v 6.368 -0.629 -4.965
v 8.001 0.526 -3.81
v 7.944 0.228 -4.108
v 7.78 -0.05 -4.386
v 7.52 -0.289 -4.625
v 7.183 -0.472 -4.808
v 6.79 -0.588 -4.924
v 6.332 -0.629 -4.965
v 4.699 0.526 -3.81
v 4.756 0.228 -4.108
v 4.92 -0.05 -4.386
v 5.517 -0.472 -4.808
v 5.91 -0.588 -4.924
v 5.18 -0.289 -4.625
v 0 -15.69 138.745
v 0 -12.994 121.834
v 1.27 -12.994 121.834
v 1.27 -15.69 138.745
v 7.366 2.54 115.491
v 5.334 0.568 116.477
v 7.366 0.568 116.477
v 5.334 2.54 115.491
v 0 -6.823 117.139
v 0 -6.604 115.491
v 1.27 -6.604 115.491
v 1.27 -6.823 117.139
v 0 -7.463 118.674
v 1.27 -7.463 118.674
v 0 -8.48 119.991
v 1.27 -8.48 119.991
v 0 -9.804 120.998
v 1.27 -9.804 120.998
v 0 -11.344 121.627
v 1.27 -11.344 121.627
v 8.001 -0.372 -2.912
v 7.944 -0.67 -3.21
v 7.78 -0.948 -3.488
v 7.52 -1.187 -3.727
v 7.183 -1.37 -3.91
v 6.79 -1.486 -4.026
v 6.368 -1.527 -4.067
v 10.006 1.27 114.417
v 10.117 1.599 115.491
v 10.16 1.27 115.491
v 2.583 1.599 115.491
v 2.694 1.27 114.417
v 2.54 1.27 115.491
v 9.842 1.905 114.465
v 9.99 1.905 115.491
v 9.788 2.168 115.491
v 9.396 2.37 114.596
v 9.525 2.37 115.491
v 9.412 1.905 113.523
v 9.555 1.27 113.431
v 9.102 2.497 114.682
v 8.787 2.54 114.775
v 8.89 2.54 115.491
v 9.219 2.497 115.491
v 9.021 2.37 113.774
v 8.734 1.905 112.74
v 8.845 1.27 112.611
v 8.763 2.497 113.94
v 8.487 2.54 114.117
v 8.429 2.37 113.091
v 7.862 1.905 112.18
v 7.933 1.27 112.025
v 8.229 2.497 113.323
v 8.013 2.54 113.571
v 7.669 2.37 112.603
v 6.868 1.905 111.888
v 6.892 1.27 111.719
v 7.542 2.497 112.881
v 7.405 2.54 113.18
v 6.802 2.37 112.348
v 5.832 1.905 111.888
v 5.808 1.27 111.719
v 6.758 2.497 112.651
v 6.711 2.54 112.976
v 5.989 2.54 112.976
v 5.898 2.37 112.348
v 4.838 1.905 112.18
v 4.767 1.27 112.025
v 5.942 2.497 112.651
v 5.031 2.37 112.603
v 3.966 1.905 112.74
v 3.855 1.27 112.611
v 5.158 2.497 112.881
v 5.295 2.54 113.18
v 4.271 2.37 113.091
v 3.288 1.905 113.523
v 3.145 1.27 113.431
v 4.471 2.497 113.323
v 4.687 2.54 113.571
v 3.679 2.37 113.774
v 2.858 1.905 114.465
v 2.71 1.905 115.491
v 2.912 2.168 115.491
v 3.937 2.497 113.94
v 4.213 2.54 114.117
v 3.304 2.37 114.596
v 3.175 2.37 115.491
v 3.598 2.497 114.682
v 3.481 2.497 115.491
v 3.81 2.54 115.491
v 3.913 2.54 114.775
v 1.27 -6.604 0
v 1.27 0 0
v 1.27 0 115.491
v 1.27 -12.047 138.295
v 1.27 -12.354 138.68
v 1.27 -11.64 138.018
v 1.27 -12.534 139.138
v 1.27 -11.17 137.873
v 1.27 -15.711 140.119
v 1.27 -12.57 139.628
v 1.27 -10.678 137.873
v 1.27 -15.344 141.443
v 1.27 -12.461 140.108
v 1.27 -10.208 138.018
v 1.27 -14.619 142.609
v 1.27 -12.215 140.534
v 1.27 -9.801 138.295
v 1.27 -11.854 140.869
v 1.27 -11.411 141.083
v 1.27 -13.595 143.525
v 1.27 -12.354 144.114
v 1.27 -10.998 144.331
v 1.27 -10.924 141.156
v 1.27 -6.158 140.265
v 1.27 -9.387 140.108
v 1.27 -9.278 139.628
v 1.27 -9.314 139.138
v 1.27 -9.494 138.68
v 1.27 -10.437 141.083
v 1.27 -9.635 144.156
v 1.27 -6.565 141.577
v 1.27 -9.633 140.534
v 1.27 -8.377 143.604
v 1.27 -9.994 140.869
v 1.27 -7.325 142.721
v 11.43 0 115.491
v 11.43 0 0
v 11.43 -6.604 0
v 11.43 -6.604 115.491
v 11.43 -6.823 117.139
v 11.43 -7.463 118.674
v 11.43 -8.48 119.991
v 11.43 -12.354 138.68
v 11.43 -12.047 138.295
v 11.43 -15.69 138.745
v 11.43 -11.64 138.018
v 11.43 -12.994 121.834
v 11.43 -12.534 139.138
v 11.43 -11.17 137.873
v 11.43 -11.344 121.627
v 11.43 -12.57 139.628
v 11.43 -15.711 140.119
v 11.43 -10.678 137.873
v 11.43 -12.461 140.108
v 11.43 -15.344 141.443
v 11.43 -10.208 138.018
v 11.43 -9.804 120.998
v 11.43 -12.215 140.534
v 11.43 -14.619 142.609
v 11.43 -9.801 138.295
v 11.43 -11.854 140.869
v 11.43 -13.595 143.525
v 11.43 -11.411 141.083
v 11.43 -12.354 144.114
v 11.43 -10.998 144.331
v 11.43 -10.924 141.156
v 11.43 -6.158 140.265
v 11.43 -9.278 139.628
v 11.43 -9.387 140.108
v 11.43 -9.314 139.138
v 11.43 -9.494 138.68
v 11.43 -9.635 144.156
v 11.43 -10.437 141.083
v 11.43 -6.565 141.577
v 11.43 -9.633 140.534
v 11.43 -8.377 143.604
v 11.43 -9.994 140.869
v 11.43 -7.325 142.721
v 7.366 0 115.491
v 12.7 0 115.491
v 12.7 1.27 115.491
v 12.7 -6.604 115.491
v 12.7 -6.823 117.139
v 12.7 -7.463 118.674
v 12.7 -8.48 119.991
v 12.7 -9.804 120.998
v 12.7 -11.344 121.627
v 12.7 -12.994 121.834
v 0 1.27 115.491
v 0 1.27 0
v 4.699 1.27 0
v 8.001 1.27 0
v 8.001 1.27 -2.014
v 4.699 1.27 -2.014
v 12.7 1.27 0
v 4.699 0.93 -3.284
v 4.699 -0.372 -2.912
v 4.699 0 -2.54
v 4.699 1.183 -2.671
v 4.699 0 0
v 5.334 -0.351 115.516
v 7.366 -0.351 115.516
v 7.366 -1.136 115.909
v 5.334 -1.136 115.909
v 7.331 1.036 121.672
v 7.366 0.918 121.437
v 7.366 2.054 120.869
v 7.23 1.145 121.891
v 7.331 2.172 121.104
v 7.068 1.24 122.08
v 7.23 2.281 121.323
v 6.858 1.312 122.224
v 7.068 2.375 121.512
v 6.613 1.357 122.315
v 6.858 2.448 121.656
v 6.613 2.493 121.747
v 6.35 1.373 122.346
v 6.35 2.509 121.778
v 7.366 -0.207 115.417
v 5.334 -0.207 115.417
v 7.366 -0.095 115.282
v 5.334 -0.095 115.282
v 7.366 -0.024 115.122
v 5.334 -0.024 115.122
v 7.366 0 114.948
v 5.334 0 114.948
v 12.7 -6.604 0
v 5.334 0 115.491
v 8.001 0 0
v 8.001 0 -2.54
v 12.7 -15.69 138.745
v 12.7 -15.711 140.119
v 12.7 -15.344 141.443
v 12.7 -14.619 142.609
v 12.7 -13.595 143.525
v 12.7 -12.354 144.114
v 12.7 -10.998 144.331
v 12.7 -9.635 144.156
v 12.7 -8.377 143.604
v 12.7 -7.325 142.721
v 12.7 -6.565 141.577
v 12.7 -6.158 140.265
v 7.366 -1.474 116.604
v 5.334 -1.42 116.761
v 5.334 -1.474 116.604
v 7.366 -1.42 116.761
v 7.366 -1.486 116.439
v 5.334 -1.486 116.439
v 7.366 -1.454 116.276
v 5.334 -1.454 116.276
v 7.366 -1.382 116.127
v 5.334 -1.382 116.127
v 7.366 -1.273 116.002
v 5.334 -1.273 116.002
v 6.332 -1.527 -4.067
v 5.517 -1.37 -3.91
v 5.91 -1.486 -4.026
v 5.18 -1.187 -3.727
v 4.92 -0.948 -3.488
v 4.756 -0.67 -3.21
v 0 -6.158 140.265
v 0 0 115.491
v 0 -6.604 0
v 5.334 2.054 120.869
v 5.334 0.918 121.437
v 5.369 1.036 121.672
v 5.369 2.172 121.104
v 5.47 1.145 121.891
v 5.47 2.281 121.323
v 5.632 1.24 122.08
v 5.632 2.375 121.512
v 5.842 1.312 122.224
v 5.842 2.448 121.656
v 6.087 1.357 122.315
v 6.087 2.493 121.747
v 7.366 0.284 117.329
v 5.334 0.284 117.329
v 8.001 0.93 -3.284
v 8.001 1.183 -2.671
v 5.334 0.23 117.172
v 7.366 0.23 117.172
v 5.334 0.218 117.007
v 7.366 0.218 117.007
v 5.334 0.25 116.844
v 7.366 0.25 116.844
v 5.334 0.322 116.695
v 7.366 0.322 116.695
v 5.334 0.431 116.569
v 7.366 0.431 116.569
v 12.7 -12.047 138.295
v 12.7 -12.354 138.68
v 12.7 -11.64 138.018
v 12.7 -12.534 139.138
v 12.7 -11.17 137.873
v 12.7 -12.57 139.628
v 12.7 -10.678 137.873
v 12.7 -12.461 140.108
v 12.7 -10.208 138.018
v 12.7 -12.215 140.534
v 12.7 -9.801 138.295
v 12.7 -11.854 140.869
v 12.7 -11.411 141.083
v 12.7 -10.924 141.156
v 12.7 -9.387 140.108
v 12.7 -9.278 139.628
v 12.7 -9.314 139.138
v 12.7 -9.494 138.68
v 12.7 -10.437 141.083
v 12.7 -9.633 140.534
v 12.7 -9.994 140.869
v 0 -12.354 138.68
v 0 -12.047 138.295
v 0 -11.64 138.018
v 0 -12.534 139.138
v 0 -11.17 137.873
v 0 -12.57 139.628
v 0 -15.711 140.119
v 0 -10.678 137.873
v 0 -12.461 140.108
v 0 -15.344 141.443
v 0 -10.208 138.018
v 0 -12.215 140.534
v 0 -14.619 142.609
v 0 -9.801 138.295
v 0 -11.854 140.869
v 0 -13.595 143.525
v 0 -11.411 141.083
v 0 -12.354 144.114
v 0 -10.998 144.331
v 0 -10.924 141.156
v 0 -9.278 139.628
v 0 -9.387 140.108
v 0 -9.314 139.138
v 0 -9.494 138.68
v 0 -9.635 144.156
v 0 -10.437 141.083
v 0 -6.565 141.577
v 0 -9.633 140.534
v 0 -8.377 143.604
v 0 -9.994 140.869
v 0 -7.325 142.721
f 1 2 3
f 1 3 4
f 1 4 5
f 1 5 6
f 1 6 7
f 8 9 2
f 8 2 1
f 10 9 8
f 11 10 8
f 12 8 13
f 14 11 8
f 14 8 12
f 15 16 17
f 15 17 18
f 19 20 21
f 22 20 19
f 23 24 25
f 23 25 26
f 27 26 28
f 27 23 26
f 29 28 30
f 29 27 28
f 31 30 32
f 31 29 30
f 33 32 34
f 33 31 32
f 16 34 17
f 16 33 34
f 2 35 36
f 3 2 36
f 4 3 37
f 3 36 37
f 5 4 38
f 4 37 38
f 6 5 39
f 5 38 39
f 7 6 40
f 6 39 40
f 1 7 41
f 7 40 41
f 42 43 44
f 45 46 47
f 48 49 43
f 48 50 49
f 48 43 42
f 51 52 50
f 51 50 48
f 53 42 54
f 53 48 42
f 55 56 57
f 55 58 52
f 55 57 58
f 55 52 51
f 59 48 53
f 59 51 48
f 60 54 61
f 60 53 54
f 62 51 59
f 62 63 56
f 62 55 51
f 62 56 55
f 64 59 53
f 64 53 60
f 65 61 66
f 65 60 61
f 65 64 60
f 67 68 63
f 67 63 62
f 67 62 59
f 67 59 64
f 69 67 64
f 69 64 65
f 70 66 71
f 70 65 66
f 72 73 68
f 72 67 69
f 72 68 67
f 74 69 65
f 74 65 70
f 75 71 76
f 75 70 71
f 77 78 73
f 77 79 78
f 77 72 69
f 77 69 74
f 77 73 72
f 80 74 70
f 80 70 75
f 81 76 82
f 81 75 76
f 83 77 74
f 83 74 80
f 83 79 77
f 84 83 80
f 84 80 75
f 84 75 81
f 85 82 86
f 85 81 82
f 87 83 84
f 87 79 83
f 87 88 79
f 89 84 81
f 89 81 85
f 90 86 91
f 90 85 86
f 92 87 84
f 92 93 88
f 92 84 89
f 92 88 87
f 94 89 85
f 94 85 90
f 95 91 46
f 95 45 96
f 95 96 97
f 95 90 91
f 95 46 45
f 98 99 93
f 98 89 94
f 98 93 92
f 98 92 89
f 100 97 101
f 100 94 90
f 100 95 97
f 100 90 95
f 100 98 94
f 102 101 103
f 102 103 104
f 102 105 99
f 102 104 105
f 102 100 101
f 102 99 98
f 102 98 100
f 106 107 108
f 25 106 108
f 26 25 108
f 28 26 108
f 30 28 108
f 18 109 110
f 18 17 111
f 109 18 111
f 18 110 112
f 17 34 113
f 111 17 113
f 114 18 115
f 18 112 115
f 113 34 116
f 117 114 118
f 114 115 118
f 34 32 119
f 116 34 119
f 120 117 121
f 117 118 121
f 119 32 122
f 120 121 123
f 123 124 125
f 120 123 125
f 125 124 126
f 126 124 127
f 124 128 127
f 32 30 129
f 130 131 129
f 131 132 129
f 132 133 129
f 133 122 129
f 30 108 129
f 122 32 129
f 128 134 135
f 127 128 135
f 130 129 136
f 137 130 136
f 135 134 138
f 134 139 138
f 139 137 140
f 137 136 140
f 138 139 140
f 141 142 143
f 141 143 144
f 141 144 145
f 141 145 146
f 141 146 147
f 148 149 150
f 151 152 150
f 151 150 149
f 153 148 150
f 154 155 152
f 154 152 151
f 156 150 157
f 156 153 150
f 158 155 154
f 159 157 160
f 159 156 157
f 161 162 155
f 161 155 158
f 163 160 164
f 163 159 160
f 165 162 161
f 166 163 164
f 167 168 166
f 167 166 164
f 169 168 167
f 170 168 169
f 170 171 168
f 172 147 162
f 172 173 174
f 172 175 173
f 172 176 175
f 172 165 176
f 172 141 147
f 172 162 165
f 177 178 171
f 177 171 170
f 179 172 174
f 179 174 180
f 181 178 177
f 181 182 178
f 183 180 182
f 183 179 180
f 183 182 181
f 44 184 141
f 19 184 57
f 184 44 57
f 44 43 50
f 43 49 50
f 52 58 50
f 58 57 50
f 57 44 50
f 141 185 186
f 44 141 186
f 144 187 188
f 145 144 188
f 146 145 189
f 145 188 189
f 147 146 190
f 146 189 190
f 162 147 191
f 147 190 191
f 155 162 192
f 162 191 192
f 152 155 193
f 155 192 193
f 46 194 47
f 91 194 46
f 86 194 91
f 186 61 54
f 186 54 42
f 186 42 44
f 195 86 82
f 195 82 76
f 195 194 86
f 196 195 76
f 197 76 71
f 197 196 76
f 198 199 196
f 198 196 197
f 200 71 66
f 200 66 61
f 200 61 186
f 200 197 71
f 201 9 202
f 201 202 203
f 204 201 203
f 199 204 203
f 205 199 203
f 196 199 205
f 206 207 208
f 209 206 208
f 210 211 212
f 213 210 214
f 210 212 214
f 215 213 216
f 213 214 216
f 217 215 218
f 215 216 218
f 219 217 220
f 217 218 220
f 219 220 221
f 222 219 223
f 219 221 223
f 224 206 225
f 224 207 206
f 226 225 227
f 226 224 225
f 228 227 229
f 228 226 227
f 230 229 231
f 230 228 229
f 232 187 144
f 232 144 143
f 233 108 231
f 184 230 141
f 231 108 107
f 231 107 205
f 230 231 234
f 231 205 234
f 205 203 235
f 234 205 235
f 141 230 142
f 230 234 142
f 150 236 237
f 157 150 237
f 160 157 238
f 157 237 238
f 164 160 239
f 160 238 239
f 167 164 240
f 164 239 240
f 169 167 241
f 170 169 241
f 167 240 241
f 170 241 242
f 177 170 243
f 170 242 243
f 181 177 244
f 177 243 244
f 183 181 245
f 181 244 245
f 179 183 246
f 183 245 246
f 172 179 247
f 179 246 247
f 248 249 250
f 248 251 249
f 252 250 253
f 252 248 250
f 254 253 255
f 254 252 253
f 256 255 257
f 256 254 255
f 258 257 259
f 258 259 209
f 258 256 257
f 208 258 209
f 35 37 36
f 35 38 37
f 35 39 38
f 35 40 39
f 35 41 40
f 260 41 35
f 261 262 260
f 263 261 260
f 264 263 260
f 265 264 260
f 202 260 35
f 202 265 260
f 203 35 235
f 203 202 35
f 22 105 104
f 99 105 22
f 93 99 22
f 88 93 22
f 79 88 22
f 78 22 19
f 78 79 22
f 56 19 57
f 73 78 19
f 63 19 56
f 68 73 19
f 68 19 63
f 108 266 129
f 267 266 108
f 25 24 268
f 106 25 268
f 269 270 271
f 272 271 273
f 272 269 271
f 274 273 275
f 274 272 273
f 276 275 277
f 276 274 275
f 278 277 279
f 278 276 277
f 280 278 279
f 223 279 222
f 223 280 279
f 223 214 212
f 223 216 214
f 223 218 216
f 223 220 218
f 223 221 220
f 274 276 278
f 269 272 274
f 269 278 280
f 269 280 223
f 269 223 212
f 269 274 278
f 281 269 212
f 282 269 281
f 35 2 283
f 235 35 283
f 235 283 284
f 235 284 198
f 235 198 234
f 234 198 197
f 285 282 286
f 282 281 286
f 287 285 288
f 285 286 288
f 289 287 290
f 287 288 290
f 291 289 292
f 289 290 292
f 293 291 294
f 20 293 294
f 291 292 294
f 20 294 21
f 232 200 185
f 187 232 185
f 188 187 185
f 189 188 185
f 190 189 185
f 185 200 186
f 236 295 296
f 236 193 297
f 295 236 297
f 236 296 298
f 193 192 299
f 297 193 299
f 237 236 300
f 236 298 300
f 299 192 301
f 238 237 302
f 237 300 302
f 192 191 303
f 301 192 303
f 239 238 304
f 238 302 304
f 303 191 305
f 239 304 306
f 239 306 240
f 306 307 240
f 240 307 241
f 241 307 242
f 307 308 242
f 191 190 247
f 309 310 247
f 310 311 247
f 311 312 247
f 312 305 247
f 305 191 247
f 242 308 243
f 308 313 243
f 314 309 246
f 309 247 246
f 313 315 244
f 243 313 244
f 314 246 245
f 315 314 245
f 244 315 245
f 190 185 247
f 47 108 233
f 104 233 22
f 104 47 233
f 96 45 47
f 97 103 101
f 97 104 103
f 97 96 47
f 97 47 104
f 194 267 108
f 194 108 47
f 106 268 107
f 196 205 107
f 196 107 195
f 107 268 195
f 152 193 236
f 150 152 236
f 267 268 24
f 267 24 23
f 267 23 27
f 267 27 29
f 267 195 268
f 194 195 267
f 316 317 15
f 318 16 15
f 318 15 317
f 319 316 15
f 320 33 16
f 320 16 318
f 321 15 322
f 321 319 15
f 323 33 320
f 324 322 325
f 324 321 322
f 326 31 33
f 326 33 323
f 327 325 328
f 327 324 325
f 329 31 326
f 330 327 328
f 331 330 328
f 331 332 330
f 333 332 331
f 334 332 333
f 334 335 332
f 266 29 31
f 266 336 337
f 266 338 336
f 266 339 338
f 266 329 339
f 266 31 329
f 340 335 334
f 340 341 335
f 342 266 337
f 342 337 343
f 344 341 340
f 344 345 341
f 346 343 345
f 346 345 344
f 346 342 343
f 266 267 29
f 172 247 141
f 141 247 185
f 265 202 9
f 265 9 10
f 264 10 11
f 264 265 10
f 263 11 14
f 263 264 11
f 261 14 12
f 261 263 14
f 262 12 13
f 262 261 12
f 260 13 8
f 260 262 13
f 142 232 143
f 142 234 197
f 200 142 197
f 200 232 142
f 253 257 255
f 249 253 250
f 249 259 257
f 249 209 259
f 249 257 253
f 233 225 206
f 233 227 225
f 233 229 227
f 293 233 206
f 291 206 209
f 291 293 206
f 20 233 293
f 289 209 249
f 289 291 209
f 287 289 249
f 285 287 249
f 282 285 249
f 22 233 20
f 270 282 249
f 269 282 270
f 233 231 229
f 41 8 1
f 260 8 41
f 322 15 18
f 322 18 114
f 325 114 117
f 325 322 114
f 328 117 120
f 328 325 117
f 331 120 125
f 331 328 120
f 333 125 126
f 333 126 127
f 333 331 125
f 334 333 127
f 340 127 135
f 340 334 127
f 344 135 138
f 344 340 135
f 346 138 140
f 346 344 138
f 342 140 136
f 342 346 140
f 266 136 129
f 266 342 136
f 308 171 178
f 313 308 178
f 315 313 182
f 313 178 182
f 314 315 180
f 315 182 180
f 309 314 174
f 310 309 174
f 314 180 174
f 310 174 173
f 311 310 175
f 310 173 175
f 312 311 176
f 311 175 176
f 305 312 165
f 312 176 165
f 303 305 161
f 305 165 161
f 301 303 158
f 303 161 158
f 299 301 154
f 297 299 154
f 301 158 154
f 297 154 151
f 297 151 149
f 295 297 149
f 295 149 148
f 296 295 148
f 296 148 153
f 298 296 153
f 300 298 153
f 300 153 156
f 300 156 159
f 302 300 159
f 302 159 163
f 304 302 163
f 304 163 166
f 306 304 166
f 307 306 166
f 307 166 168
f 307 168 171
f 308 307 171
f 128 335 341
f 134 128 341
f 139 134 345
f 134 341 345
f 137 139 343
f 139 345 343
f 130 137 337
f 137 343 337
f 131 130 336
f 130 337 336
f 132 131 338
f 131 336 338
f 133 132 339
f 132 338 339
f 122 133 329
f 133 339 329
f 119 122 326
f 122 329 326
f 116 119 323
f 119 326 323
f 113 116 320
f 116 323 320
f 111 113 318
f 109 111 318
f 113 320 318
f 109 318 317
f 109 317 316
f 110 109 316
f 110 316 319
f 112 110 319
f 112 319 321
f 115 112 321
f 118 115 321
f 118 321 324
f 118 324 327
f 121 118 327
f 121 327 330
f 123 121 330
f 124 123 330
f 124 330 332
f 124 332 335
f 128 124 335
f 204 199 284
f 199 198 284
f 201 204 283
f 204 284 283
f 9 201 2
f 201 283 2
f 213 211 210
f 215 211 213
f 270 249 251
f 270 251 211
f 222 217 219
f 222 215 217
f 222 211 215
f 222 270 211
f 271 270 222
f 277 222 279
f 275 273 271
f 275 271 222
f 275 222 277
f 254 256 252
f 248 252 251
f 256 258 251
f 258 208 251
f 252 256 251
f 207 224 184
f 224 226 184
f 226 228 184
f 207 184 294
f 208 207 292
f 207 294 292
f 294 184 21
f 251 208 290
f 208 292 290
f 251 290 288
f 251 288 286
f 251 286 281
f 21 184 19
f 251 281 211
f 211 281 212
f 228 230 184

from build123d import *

# Parameters (mm, degrees)
SKETCH1_W                = 12.7
SKETCH1_H                = 115.490625
BOSS_EXTRUDE1_DEPTH      = 1.27
SKETCH2_W                = 5.08
SKETCH2_H                = 24.638
CUT_EXTRUDE1_DEPTH       = 1.27
SKETCH3_R                = 1.778
CUT_EXTRUDE2_DEPTH       = 1.27
SKETCH4_R                = 1.778
CUT_EXTRUDE3_DEPTH       = 1.27
CUT_EXTRUDE4_DEPTH       = 1.27
REVOLVE1_ANGLE           = 180
BOSS_EXTRUDE2_DEPTH      = 1.651
BOSS_EXTRUDE2_DEPTH_BACK = 1.651
FILLET1_R                = 2.54
CUT_EXTRUDE5_START       = -1.27
CUT_EXTRUDE5_DEPTH       = 1.27
BOSS_EXTRUDE3_DEPTH      = 1.016
BOSS_EXTRUDE3_DEPTH_BACK = 1.016
FILLET2_R                = 0.635
FILLET3_R                = 0.635
FILLET4_R                = 0.635
CUT_EXTRUDE6_DEPTH       = 112.292512614
SKETCH13_W               = 115.490625
SKETCH13_H               = 7.874
BOSS_EXTRUDE4_DEPTH      = 1.27
FILLET6_R                = 0.635
BOSS_EXTRUDE5_DEPTH      = 1.27
CUT_EXTRUDE7_REACH       = 147.742
SKETCH16_R               = 1.651


# Read off the part's stored shape, not the designer's step: Cut-Extrude5
with BuildPart() as part:
    # Sketch1 → Boss-Extrude1 (new body)
    with BuildSketch(Plane(origin=(0, 0, 0), x_dir=(1, 0, 0), z_dir=(0, 1, 0))):
        with Locations((6.35, -57.7453125)):
            Rectangle(SKETCH1_W, SKETCH1_H)
    boss_extrude1 = extrude(amount=BOSS_EXTRUDE1_DEPTH)

    # Sketch2 → Cut-Extrude1 (cut)
    with BuildSketch(Plane(origin=(0, 1.27, 0), x_dir=(1, 0, 0), z_dir=(0, 1, 0))):
        with Locations((6.35, -33.147)):
            Rectangle(SKETCH2_W, SKETCH2_H)
    extrude(amount=-CUT_EXTRUDE1_DEPTH, mode=Mode.SUBTRACT)

    # Sketch3 → Cut-Extrude2 (cut)
    with BuildSketch(Plane(origin=(0, 1.27, 0), x_dir=(1, 0, 0), z_dir=(0, 1, 0))):
        with Locations(Location((6.35, -58.674, 0), (0, 0, 270))):
            Circle(SKETCH3_R)
    extrude(amount=-CUT_EXTRUDE2_DEPTH, mode=Mode.SUBTRACT)

    # Sketch4 → Cut-Extrude3 (cut)
    with BuildSketch(Plane(origin=(0, 1.27, 0), x_dir=(1, 0, 0), z_dir=(0, 1, 0))):
        with Locations(Location((6.35, -113.03, 0), (0, 0, 270))):
            Circle(SKETCH4_R)
    extrude(amount=-CUT_EXTRUDE3_DEPTH, mode=Mode.SUBTRACT)

    # Sketch5 → Cut-Extrude4 (cut)
    with BuildSketch(Plane(origin=(0, 1.27, 0), x_dir=(1, 0, 0), z_dir=(0, 1, 0))):
        Polygon((5.077023467, -4.318), (7.62, -4.318), (8.89, -5.588), (8.89, -13.208), (3.81, -13.208), (3.81, -5.585023467), align=None)
    extrude(amount=-CUT_EXTRUDE4_DEPTH, mode=Mode.SUBTRACT)

    # Sketch6 → Revolve1 (revolve)
    with BuildSketch(Plane.XY.offset(115.490625)):
        with BuildLine():
            Line((6.35, 1.27), (10.16, 1.27))
            ThreePointArc((10.16, 1.27), (9.788025612, 2.168025612), (8.89, 2.54))
            Line((8.89, 2.54), (6.35, 2.54))
            Line((6.35, 2.54), (6.35, 1.27))
        make_face()
    revolve(axis=Axis((6.35, 1.27, 115.490625), (0, 1, 0)), revolution_arc=REVOLVE1_ANGLE)

    # Sketch7 → Boss-Extrude2 (add, two sides: drawn at the far end of the back side and taken through both)
    with BuildSketch(Plane(origin=(6.35, 0, 0), x_dir=(0, 0, -1), z_dir=(1, 0, 0)).offset(-BOSS_EXTRUDE2_DEPTH_BACK)):
        Polygon((0, 1.27), (3.066051224, 1.27), (4.964704214, -0.62865299), (4.066678602, -1.526678602), (2.54, 0), (0, 0), align=None)
    extrude(amount=BOSS_EXTRUDE2_DEPTH + BOSS_EXTRUDE2_DEPTH_BACK)

    # Fillet1
    fillet1_edges = [part.edges().sort_by_distance(p)[0] for p in [
        (6.35, 1.27, -3.066051224),
    ]]
    fillet(fillet1_edges, radius=FILLET1_R)

    # Cut-Extrude5 outline → Cut-Extrude5 (cut)
    with BuildSketch(Plane(origin=(0, 2.168025612, -2.168025612), x_dir=(1, 0, 0), z_dir=(0, 0.7071067811865515, -0.7071067811865437)).offset(CUT_EXTRUDE5_START)):
        with BuildLine():
            ThreePointArc((4.699, 2.322102448), (5.179912981, 3.474187827), (6.33199836, 3.955100809))
            Line((6.33199836, 3.955100809), (4.699, 3.955100809))
            Line((4.699, 3.955100809), (4.699, 2.322102448))
        make_face()
    cut_extrude5 = extrude(amount=CUT_EXTRUDE5_DEPTH, mode=Mode.SUBTRACT)

    # Mirror1: Cut-Extrude5 across plane
    add(cut_extrude5.mirror(Plane(origin=(6.35, 0, 0), x_dir=(0, 0, 1), z_dir=(1, 0, 0))), mode=Mode.SUBTRACT)

    # Sketch11 → Boss-Extrude3 (add, two sides: drawn at the far end of the back side and taken through both)
    with BuildSketch(Plane(origin=(6.35, 0, 0), x_dir=(0, 0, -1), z_dir=(1, 0, 0)).offset(-BOSS_EXTRUDE3_DEPTH_BACK)):
        Polygon((-115.340721834, 0), (-116.192663734, -1.703883799), (-122.345747046, 1.372657857), (-121.77778578, 2.50858039), (-116.760625, 0), (-115.490625, 2.54), (-115.490625, 0), align=None)
    extrude(amount=BOSS_EXTRUDE3_DEPTH + BOSS_EXTRUDE3_DEPTH_BACK)

    # Fillet2
    fillet2_edges = [part.edges().sort_by_distance(p)[0] for p in [
        (6.35, 0, 116.760625),
    ]]
    fillet(fillet2_edges, radius=FILLET2_R)

    # Fillet3
    fillet3_edges = [part.edges().sort_by_distance(p)[0] for p in [
        (6.35, -1.703883799, 116.192663734),
    ]]
    fillet(fillet3_edges, radius=FILLET3_R)

    # Fillet4
    fillet4_edges = [part.edges().sort_by_distance(p)[0] for p in [
        (6.35, 0, 115.340721834),
    ]]
    fillet(fillet4_edges, radius=FILLET4_R)

    # Sketch12 → Cut-Extrude6 (cut, through all)
    with BuildSketch(Plane(origin=(0, -46.70425, 23.352125), x_dir=(1, 0, 0), z_dir=(0, 0.8944271909999153, -0.4472135954999592))):
        with BuildLine():
            Line((6.35, -110.043234117), (7.366, -110.043234117))
            Line((7.366, -110.043234117), (7.366, -109.027234117))
            ThreePointArc((7.366, -109.027234117), (7.06842049, -109.745654607), (6.35, -110.043234117))
        make_face()
    cut_extrude6 = extrude(amount=-CUT_EXTRUDE6_DEPTH, mode=Mode.SUBTRACT)

    # Mirror2: Cut-Extrude6 across plane
    add(cut_extrude6.mirror(Plane(origin=(6.35, 0, 0), x_dir=(0, 0, 1), z_dir=(1, 0, 0))), mode=Mode.SUBTRACT)

    # Sketch13 → Boss-Extrude4 (add)
    with BuildSketch(Plane(origin=(0, 0, 0), x_dir=(0, 0, -1), z_dir=(1, 0, 0))):
        with Locations((-57.7453125, -2.667)):
            Rectangle(SKETCH13_W, SKETCH13_H)
    boss_extrude4 = extrude(amount=BOSS_EXTRUDE4_DEPTH)

    # Fillet6
    fillet6_edges = [part.edges().sort_by_distance(p)[0] for p in [
        (0, 1.27, 57.7453125),
    ]]
    fillet(fillet6_edges, radius=FILLET6_R)

    # Sketch14 → Boss-Extrude5 (add)
    with BuildSketch(Plane(origin=(0, 0, 0), x_dir=(0, 0, -1), z_dir=(1, 0, 0))):
        with BuildLine():
            Line((-121.834273366, -12.993842066), (-138.745315854, -15.689805361))
            ThreePointArc((-138.745315854, -15.689805361), (-144.2709028, -11.683754825), (-140.264852264, -6.158167879))
            Line((-140.264852264, -6.158167879), (-115.490625, 0))
            Line((-115.490625, 0), (-115.490625, -6.604))
            ThreePointArc((-115.490625, -6.604), (-119.99078577, -8.48018731), (-121.834273366, -12.993842066))
        make_face()
    boss_extrude5 = extrude(amount=BOSS_EXTRUDE5_DEPTH)

    # Mirror3: Boss-Extrude1, Boss-Extrude4, Boss-Extrude5 across plane
    add(boss_extrude1.mirror(Plane(origin=(6.35, 0, 0), x_dir=(0, 0, 1), z_dir=(1, 0, 0))))
    add(boss_extrude4.mirror(Plane(origin=(6.35, 0, 0), x_dir=(0, 0, 1), z_dir=(1, 0, 0))))
    add(boss_extrude5.mirror(Plane(origin=(6.35, 0, 0), x_dir=(0, 0, 1), z_dir=(1, 0, 0))))

    # Cut-Extrude7: up to this face of the body (flat: up to its plane)
    cut_extrude7_end = Plane(part.part.faces().sort_by_distance((12.7, -4.009508171, 74.287192312))[0])
    # Sketch16 → Cut-Extrude7 (cut, up to the picked face)
    with BuildSketch(Plane.ZY, mode=Mode.PRIVATE) as cut_extrude7_sk1:
        with Locations((139.505084059, -10.92398662)):
            Circle(SKETCH16_R)
    cut_extrude7_tool1 = split(extrude(cut_extrude7_sk1.sketch, amount=-CUT_EXTRUDE7_REACH, mode=Mode.PRIVATE), bisect_by=cut_extrude7_end, keep=Keep.BOTH, mode=Mode.PRIVATE)
    add(cut_extrude7_tool1.solids().sort_by(Axis((0, -10.923987, 139.505084), (1, 0, 0)))[0], mode=Mode.SUBTRACT)


solid = part.part
